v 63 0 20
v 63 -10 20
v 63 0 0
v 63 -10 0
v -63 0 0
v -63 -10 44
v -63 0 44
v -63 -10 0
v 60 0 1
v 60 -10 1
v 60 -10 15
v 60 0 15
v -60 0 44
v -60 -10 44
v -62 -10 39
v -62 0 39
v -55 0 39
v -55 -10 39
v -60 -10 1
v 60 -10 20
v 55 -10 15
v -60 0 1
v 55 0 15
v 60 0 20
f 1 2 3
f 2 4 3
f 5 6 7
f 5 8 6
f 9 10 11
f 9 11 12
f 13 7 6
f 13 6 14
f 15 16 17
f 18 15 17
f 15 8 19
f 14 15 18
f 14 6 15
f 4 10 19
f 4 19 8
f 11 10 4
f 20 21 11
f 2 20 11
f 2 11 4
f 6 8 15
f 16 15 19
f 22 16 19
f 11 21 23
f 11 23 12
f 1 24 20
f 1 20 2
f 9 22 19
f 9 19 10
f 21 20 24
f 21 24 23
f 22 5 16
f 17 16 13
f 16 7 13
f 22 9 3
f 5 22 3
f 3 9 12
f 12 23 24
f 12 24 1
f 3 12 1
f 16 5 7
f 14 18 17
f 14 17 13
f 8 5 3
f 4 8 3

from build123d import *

# Parameters (mm, degrees)
F0_W     = 126
F0_H     = 1
F1_DEPTH = 10
F2_W     = 3
F2_H     = 10
F3_DEPTH = 43
F4_DEPTH = 19
F6_DEPTH = 10
F7_DEPTH = 10
F9_DEPTH = 25


with BuildPart() as f1:
    # F0 (on Front) → F1 (new body)
    with BuildSketch(Plane.XZ):
        with Locations((0, 0.5)):
            Rectangle(F0_W, F0_H)
    extrude(amount=F1_DEPTH)

    # F2 (on face) → F3 (join)
    with BuildSketch(Plane.XY.offset(1)):
        with Locations((-61.5, -5)):
            Rectangle(F2_W, F2_H)
    extrude(amount=F3_DEPTH)

    # F2 (on face) → F4 (join)
    with BuildSketch(Plane.XY.offset(1)):
        with Locations((61.5, -5)):
            Rectangle(F2_W, F2_H)
    extrude(amount=F4_DEPTH)

    # F5 (on face) → F6 (join)
    with BuildSketch(Plane.XZ.offset(10)):
        Polygon((-55, 39), (-60, 44), (-60, 39), align=None)
    extrude(amount=-F6_DEPTH)

    # F5 (on face) → F7 (join)
    with BuildSketch(Plane.XZ.offset(10)):
        Polygon((55, 15), (60, 15), (60, 20), align=None)
    extrude(amount=-F7_DEPTH)

    # F8 (on face) → F9 (cut)
    with BuildSketch(Plane.XZ.offset(10)):
        Polygon((-62, 39), (-60, 1), (-60, 39), align=None)
    extrude(amount=-F9_DEPTH, mode=Mode.SUBTRACT)


solid = f1.part
